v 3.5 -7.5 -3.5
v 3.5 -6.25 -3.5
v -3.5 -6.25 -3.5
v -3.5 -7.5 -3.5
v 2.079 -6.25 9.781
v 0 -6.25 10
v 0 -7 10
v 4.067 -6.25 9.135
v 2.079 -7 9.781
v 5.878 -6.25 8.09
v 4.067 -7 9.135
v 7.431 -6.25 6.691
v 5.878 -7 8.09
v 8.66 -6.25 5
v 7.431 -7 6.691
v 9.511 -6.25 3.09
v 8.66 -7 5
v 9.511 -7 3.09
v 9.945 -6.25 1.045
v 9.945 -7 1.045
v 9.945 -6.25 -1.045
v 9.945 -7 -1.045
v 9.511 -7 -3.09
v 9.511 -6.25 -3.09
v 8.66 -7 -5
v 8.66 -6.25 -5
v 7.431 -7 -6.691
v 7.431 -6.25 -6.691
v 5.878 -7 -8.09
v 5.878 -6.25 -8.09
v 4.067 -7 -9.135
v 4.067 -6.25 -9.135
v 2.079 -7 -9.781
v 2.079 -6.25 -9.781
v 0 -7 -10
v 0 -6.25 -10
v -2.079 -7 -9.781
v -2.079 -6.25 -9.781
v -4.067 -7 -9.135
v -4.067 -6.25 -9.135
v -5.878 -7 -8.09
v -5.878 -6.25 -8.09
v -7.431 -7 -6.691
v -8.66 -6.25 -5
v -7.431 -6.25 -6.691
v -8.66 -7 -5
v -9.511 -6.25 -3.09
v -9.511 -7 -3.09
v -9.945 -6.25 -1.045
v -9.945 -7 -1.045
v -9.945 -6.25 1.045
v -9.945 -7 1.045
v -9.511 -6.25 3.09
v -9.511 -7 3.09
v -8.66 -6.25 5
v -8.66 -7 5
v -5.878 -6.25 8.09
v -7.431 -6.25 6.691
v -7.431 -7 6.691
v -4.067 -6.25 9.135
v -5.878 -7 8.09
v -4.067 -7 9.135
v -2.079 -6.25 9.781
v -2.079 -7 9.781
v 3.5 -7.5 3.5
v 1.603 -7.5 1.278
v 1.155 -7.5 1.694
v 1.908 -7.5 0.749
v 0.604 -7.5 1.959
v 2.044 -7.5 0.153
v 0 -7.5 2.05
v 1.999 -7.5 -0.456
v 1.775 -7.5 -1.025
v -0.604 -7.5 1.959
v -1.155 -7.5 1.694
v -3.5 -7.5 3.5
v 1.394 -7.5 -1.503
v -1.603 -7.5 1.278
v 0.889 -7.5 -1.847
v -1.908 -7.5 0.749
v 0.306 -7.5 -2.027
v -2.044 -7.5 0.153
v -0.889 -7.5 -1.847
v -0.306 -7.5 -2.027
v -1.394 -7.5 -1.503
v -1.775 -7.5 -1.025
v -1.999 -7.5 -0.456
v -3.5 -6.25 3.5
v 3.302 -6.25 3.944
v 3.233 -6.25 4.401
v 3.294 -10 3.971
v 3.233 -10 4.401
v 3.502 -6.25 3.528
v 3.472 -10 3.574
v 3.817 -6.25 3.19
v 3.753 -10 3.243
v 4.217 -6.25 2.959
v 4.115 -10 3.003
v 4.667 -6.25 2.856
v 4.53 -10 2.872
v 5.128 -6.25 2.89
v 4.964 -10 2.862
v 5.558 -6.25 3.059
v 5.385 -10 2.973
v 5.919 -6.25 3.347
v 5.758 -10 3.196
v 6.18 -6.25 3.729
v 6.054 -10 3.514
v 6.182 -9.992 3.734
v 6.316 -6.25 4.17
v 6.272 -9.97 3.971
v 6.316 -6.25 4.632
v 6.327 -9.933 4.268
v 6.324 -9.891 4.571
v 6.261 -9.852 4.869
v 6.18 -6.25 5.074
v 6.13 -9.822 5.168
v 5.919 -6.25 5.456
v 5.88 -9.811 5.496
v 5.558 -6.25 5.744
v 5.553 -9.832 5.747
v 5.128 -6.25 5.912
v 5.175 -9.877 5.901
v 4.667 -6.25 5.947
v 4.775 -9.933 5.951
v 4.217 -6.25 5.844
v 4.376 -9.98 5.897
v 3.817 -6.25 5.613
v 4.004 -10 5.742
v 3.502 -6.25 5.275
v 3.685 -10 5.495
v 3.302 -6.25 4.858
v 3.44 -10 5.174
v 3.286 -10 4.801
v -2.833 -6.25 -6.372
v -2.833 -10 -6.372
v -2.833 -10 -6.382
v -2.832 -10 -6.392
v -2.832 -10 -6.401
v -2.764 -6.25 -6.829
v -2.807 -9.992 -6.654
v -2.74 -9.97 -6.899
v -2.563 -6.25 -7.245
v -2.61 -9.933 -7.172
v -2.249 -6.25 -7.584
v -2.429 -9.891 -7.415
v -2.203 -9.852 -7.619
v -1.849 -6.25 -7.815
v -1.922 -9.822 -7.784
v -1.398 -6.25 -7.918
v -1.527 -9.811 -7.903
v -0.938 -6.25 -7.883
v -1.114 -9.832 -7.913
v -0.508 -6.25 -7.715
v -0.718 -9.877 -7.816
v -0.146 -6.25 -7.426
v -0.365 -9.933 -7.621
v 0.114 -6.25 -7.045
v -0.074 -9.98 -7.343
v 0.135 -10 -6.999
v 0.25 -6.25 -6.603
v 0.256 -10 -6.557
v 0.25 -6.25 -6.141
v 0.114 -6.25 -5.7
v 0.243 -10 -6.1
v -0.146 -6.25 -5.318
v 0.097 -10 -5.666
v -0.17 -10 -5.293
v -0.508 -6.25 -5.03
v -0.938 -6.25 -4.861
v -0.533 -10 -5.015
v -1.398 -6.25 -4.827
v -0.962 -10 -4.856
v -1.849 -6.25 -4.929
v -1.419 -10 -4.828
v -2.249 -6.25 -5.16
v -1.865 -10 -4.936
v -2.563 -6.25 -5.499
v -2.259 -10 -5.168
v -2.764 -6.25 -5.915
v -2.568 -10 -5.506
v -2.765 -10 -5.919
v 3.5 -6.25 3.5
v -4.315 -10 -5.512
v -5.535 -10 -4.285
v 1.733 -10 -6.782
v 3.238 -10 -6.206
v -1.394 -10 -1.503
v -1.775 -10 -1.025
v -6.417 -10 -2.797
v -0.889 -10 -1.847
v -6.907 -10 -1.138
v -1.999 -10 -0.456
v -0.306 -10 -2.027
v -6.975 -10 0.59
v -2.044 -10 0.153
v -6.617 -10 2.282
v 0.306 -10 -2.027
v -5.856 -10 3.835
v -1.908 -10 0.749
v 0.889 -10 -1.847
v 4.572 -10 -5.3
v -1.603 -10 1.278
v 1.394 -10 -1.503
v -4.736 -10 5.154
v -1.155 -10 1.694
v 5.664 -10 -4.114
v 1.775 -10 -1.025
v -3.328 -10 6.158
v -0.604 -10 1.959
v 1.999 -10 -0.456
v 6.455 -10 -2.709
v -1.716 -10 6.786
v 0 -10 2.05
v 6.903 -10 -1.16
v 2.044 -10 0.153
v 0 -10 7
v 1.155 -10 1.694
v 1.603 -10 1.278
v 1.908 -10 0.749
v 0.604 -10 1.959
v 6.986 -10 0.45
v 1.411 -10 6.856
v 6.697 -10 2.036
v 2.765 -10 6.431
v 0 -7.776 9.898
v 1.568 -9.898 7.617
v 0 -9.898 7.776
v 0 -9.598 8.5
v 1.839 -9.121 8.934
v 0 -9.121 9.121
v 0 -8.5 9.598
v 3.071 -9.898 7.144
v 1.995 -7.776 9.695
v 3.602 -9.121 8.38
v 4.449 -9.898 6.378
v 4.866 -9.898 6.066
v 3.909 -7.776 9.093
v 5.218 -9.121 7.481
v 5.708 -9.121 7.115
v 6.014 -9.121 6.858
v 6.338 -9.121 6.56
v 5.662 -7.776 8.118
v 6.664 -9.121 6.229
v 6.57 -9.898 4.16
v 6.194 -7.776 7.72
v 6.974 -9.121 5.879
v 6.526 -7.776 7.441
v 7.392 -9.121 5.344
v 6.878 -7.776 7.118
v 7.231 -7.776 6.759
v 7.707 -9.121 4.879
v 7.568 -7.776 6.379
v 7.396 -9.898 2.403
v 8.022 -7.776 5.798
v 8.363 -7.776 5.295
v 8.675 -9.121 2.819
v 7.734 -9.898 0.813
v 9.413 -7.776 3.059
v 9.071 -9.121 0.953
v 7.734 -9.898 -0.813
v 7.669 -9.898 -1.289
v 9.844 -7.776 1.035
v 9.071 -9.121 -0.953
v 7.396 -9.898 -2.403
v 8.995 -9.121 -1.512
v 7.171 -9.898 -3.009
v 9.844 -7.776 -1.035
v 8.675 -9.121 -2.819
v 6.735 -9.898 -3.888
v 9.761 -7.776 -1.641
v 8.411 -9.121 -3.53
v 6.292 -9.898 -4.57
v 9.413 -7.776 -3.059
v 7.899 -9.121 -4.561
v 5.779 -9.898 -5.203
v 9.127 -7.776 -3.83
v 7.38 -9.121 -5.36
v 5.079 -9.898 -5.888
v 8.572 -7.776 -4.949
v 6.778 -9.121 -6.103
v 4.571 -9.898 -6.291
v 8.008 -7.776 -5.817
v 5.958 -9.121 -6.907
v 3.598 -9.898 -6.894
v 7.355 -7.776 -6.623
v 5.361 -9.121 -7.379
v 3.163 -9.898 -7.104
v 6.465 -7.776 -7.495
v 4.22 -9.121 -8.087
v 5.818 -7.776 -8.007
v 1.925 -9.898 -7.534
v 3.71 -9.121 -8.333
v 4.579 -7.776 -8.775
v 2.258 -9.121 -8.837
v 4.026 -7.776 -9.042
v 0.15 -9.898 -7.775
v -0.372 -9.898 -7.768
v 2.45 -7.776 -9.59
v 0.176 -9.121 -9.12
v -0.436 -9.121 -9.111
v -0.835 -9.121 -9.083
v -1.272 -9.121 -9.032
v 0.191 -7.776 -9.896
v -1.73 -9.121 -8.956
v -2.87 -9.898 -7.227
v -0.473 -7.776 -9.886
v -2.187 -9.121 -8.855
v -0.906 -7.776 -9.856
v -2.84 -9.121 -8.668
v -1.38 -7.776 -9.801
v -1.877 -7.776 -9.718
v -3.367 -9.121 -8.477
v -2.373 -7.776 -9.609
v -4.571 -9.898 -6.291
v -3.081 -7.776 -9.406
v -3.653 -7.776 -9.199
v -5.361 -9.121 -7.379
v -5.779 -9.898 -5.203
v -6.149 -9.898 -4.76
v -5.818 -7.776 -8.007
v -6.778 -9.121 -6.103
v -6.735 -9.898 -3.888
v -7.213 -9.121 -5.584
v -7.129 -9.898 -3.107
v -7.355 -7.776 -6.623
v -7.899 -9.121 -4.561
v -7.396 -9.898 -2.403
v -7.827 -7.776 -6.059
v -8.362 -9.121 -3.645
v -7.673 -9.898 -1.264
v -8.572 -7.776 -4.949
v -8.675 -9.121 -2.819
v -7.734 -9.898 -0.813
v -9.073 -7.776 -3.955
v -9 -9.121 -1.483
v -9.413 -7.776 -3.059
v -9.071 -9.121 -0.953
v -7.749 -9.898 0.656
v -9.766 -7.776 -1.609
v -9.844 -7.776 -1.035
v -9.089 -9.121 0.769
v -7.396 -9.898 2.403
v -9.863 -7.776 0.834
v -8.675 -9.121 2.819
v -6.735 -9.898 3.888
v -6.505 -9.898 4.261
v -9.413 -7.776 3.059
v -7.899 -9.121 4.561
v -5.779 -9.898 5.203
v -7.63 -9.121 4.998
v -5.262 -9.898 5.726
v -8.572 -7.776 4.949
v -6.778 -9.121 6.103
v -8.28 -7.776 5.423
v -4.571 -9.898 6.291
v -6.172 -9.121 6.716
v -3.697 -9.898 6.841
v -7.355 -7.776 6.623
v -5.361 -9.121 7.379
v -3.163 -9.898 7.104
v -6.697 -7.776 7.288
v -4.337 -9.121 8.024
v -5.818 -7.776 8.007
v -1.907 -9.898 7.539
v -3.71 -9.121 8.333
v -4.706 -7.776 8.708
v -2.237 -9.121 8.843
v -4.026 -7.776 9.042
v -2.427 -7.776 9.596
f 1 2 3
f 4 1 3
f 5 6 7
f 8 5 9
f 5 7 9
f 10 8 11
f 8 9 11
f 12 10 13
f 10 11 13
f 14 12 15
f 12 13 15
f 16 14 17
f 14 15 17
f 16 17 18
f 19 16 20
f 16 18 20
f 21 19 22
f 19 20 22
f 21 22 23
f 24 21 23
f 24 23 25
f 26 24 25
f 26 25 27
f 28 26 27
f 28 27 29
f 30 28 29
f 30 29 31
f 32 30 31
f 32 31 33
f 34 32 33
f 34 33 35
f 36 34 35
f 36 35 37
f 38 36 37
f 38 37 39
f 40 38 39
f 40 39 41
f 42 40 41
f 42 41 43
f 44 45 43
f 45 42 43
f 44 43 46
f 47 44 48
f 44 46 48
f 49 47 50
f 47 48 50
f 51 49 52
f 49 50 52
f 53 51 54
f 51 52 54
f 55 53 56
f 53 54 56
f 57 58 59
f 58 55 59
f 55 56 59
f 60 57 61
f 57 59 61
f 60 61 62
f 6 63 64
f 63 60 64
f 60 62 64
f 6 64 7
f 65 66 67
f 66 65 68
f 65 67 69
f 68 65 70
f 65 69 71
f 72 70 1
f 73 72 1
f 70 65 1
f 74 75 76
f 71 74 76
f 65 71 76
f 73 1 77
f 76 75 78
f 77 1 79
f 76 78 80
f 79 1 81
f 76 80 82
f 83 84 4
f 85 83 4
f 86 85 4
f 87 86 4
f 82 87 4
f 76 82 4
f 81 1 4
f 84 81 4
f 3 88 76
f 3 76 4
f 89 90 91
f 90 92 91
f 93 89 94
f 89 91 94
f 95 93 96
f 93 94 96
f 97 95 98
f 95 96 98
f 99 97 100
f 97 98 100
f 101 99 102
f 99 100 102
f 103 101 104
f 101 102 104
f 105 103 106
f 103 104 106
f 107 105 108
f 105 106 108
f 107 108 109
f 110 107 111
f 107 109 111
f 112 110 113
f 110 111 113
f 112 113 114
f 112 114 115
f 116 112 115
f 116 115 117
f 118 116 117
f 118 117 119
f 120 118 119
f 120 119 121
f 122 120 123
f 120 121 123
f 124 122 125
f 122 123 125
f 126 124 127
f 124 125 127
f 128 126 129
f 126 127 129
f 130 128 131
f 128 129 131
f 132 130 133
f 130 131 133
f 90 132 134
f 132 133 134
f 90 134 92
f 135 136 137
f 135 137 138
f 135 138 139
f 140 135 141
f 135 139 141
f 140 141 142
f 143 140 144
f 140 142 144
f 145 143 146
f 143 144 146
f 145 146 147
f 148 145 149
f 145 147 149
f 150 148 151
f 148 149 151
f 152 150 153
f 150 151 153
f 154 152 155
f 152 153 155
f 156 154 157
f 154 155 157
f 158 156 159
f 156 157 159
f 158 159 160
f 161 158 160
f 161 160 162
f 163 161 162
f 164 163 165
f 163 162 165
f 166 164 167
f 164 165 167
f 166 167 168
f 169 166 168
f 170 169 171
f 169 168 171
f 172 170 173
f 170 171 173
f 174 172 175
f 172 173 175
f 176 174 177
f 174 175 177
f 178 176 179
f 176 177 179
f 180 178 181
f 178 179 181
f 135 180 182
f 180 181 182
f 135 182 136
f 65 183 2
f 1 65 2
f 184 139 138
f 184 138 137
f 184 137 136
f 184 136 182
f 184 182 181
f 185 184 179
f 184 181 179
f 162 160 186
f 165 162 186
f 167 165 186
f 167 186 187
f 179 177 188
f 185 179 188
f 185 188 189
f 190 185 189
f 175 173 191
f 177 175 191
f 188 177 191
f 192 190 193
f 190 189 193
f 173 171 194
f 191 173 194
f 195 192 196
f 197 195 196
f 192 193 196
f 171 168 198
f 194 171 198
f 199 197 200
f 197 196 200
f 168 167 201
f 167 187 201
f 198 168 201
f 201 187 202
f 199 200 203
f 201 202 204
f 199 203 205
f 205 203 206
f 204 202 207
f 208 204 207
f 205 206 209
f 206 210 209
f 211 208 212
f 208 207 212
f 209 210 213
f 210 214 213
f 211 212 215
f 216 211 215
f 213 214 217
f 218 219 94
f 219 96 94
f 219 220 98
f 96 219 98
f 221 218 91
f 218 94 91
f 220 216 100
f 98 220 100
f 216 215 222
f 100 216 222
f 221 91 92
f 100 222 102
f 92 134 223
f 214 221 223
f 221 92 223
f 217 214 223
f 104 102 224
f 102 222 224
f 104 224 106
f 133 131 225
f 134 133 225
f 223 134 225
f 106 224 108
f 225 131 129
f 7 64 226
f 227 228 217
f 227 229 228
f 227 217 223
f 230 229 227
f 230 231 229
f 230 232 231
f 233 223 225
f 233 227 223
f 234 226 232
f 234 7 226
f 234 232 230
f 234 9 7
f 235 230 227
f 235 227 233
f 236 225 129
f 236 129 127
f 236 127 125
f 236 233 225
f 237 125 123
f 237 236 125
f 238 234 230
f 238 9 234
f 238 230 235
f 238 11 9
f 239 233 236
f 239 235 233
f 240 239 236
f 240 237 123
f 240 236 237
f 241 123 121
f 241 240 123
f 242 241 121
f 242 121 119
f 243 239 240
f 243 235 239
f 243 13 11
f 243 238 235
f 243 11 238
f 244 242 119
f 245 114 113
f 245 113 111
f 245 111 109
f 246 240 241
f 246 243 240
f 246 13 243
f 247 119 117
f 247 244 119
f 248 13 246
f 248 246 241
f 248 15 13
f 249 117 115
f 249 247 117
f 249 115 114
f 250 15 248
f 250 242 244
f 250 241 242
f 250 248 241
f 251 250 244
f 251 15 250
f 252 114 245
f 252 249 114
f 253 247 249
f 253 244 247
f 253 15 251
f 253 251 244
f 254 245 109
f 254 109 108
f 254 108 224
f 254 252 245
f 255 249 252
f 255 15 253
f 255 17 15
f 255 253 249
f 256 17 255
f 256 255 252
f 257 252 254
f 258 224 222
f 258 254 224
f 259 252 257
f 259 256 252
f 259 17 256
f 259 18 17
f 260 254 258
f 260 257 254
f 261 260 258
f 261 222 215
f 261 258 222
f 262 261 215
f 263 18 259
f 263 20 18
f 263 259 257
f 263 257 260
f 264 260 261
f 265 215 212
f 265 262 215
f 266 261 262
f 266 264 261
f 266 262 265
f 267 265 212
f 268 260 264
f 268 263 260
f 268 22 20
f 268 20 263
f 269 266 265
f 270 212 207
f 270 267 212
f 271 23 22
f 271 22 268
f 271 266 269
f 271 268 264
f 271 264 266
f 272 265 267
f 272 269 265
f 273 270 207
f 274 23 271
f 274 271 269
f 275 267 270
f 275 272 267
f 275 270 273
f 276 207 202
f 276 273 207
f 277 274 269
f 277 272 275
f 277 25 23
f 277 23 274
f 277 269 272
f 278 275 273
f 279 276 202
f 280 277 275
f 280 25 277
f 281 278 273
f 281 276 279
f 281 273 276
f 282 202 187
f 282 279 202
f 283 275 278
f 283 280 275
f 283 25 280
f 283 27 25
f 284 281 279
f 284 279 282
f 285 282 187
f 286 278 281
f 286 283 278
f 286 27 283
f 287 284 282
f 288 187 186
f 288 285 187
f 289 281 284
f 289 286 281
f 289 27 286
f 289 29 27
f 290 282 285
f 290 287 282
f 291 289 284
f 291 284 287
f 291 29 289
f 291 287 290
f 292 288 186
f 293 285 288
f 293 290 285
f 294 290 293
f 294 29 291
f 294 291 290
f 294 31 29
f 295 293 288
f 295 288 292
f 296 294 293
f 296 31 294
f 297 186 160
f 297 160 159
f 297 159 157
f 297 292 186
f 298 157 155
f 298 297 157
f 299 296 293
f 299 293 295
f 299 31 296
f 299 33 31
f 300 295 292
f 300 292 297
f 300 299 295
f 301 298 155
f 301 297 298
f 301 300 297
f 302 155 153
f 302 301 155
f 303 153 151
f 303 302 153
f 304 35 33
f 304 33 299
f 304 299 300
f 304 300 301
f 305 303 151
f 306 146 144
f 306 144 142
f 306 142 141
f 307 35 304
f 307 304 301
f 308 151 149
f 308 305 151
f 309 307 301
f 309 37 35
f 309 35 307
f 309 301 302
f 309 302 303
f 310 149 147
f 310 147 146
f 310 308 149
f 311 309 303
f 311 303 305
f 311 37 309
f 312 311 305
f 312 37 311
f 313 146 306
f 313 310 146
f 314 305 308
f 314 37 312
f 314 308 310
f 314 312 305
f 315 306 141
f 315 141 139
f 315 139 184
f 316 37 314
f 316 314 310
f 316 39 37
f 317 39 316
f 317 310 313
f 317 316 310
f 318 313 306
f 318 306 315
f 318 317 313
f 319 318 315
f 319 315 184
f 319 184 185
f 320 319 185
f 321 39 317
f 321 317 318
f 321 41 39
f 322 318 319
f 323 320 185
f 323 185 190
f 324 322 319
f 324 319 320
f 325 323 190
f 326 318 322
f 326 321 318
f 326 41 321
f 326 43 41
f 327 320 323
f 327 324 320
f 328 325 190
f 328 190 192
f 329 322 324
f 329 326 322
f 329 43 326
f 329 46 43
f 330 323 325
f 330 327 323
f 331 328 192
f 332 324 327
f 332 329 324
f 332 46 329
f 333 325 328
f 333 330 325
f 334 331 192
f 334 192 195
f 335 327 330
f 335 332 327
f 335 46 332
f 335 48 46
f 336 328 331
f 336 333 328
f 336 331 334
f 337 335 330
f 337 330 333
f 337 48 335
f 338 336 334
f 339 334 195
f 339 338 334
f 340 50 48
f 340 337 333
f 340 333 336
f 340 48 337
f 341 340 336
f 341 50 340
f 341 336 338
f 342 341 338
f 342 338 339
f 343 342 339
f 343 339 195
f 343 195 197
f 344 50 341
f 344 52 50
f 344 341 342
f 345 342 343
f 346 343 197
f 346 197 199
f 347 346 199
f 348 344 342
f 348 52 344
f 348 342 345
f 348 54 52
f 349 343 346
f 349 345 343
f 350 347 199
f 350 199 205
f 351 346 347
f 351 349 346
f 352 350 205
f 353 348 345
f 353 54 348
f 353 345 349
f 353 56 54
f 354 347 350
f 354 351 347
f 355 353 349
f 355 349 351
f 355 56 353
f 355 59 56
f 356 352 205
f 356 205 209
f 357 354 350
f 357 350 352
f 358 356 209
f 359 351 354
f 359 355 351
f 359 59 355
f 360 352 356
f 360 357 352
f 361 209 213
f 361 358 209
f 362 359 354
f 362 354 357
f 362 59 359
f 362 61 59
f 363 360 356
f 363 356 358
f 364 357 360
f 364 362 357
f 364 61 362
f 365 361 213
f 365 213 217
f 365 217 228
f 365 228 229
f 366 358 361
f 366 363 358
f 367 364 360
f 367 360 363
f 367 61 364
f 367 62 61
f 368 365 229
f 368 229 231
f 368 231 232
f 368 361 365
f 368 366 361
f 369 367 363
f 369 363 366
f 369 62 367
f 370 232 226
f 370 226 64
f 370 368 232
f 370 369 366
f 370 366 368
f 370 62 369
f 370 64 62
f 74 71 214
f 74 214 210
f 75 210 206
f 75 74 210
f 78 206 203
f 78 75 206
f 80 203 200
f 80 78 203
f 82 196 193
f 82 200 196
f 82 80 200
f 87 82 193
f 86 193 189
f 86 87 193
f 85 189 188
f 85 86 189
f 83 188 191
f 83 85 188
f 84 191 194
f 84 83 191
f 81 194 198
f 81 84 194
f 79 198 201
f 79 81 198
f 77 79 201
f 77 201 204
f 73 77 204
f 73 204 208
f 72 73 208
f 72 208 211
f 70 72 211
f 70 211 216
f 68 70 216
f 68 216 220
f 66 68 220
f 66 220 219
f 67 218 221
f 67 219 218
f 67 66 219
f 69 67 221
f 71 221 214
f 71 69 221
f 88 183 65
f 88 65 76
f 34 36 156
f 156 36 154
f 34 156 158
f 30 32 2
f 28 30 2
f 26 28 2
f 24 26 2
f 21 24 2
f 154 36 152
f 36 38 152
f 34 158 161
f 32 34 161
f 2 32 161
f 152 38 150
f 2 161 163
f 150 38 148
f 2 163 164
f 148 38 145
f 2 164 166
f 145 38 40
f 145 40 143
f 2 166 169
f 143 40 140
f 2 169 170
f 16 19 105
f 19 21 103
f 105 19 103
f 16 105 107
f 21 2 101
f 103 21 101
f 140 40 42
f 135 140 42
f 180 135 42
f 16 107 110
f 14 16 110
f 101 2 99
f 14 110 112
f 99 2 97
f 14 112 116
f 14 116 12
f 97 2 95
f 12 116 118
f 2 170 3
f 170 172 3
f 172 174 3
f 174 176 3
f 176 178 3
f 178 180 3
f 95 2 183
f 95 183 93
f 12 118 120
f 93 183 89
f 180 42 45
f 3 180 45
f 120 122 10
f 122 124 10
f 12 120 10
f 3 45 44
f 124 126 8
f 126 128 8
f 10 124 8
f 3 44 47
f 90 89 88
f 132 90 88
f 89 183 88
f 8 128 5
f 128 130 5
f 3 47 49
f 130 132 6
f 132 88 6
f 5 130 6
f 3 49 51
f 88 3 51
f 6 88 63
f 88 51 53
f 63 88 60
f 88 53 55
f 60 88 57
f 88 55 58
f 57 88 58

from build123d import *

# Parameters (mm, degrees)
BOSS_EXTRUDE1_DEPTH        = 3
BOSS_EXTRUDE1_DEPTH_BACK   = 10
SKETCH1_R                  = 10
SKETCH4_R                  = 1.5
HOLE_DEPTH                 = 20.973741561
HOLECIR_COUNT              = 5
SKETCH6_W                  = 7
SKETCH6_H                  = 7
BEARINGHOLE_DEPTH          = 2.5
SKETCH7_R                  = 2.05
SHAFTHOLE_DEPTH            = 17.248076982
F_3_1_3_1_DIAMETER_HOLE1_D = 3.1
FILLET2_R                  = 3
SKETCH11_R                 = 10
CUT_EXTRUDE1_DEPTH         = 10


with BuildPart() as part:
    # Sketch1 → Boss-Extrude1 (new, two sides: drawn at the far end of the back side and taken through both)
    with BuildSketch(Plane(origin=(0, 0, 0), x_dir=(1, 0, 0), z_dir=(0, 1, 0)).offset(-BOSS_EXTRUDE1_DEPTH_BACK)):
        with Locations(Location((0, 0, 0), (0, 0, 270))):
            Circle(SKETCH1_R)
    extrude(amount=BOSS_EXTRUDE1_DEPTH + BOSS_EXTRUDE1_DEPTH_BACK)

    # Sketch4 → hole (cut, through all)
    with BuildSketch(Plane(origin=(-3.352872105, -1.093066116, 1.887711608), x_dir=(-0.4486862613641547, -0.14627571033740308, -0.8816371449912632), z_dir=(0.8382180262940947, 0.2732665289126682, -0.47192790187872385))):
        with Locations(Location((0, 0, 0), (0, 0, 8.746528197))):
            Circle(SKETCH4_R)
    hole = extrude(amount=-HOLE_DEPTH, mode=Mode.SUBTRACT)

    # holecir: hole ×5 about axis
    holecir_axis = Axis((0, 0, 0), (0, 1, 0))
    for i in range(1, HOLECIR_COUNT):
        add(hole.rotate(holecir_axis, i * 360 / HOLECIR_COUNT), mode=Mode.SUBTRACT)

    # Sketch6 → bearinghole (cut)
    with BuildSketch(Plane(origin=(0, -5, 0), x_dir=(-1, 0, 0), z_dir=(0, -1, 0))):
        Rectangle(SKETCH6_W, SKETCH6_H)
    extrude(amount=BEARINGHOLE_DEPTH, mode=Mode.SUBTRACT)

    # Sketch7 → shafthole (cut, through all)
    with BuildSketch(Plane(origin=(0, -5, 0), x_dir=(-1, 0, 0), z_dir=(0, -1, 0))):
        with Locations(Location((0, 0, 0), (0, 0, 270))):
            Circle(SKETCH7_R)
    extrude(amount=SHAFTHOLE_DEPTH, mode=Mode.SUBTRACT)

    # Ø3.1 (3.1) Diameter Hole1 (through all)
    with Locations(Plane(origin=(0, 3, 0), x_dir=(1, 0, 0), z_dir=(0, 1, 0))):
        with Locations((-1.282558474, 6.372208703), (4.783101903, -4.401356176)):
            Hole(F_3_1_3_1_DIAMETER_HOLE1_D / 2)

    # Fillet2
    # the kernel refuses this fillet: 3 mm, written as the material it takes off along each edge
    with BuildSketch(Plane(origin=(0, 3, 0), x_dir=(0, 0, 1), z_dir=(-1, 0, 0))) as fillet2_piece_1:
        with BuildLine():
            CenterArc((10 - FILLET2_R, -FILLET2_R), FILLET2_R, 0, 90)
            Line((10 - FILLET2_R, 0), (10, 0))
            Line((10, 0), (10, -FILLET2_R))
        make_face()
    revolve(axis=Axis((0, 3, 0), (0, 1, 0)), mode=Mode.SUBTRACT)
    with BuildSketch(Plane(origin=(0, -10, 0), x_dir=(0, 0, 1), z_dir=(-1, 0, 0))) as fillet2_piece_2:
        with BuildLine():
            CenterArc((10 - FILLET2_R, FILLET2_R), FILLET2_R, 270, 90)
            Line((10 - FILLET2_R, 0), (10, 0))
            Line((10, 0), (10, FILLET2_R))
        make_face()
    revolve(axis=Axis((0, -10, 0), (0, 1, 0)), mode=Mode.SUBTRACT)

    # Sketch11 → Cut-Extrude1 (cut)
    with BuildSketch(Plane(origin=(0, -6.25, 0), x_dir=(-1, 0, 0), z_dir=(0, -1, 0))):
        with Locations(Location((0, 0, 0), (0, 0, 270))):
            Circle(SKETCH11_R)
    extrude(amount=-CUT_EXTRUDE1_DEPTH, mode=Mode.SUBTRACT)


solid = part.part
